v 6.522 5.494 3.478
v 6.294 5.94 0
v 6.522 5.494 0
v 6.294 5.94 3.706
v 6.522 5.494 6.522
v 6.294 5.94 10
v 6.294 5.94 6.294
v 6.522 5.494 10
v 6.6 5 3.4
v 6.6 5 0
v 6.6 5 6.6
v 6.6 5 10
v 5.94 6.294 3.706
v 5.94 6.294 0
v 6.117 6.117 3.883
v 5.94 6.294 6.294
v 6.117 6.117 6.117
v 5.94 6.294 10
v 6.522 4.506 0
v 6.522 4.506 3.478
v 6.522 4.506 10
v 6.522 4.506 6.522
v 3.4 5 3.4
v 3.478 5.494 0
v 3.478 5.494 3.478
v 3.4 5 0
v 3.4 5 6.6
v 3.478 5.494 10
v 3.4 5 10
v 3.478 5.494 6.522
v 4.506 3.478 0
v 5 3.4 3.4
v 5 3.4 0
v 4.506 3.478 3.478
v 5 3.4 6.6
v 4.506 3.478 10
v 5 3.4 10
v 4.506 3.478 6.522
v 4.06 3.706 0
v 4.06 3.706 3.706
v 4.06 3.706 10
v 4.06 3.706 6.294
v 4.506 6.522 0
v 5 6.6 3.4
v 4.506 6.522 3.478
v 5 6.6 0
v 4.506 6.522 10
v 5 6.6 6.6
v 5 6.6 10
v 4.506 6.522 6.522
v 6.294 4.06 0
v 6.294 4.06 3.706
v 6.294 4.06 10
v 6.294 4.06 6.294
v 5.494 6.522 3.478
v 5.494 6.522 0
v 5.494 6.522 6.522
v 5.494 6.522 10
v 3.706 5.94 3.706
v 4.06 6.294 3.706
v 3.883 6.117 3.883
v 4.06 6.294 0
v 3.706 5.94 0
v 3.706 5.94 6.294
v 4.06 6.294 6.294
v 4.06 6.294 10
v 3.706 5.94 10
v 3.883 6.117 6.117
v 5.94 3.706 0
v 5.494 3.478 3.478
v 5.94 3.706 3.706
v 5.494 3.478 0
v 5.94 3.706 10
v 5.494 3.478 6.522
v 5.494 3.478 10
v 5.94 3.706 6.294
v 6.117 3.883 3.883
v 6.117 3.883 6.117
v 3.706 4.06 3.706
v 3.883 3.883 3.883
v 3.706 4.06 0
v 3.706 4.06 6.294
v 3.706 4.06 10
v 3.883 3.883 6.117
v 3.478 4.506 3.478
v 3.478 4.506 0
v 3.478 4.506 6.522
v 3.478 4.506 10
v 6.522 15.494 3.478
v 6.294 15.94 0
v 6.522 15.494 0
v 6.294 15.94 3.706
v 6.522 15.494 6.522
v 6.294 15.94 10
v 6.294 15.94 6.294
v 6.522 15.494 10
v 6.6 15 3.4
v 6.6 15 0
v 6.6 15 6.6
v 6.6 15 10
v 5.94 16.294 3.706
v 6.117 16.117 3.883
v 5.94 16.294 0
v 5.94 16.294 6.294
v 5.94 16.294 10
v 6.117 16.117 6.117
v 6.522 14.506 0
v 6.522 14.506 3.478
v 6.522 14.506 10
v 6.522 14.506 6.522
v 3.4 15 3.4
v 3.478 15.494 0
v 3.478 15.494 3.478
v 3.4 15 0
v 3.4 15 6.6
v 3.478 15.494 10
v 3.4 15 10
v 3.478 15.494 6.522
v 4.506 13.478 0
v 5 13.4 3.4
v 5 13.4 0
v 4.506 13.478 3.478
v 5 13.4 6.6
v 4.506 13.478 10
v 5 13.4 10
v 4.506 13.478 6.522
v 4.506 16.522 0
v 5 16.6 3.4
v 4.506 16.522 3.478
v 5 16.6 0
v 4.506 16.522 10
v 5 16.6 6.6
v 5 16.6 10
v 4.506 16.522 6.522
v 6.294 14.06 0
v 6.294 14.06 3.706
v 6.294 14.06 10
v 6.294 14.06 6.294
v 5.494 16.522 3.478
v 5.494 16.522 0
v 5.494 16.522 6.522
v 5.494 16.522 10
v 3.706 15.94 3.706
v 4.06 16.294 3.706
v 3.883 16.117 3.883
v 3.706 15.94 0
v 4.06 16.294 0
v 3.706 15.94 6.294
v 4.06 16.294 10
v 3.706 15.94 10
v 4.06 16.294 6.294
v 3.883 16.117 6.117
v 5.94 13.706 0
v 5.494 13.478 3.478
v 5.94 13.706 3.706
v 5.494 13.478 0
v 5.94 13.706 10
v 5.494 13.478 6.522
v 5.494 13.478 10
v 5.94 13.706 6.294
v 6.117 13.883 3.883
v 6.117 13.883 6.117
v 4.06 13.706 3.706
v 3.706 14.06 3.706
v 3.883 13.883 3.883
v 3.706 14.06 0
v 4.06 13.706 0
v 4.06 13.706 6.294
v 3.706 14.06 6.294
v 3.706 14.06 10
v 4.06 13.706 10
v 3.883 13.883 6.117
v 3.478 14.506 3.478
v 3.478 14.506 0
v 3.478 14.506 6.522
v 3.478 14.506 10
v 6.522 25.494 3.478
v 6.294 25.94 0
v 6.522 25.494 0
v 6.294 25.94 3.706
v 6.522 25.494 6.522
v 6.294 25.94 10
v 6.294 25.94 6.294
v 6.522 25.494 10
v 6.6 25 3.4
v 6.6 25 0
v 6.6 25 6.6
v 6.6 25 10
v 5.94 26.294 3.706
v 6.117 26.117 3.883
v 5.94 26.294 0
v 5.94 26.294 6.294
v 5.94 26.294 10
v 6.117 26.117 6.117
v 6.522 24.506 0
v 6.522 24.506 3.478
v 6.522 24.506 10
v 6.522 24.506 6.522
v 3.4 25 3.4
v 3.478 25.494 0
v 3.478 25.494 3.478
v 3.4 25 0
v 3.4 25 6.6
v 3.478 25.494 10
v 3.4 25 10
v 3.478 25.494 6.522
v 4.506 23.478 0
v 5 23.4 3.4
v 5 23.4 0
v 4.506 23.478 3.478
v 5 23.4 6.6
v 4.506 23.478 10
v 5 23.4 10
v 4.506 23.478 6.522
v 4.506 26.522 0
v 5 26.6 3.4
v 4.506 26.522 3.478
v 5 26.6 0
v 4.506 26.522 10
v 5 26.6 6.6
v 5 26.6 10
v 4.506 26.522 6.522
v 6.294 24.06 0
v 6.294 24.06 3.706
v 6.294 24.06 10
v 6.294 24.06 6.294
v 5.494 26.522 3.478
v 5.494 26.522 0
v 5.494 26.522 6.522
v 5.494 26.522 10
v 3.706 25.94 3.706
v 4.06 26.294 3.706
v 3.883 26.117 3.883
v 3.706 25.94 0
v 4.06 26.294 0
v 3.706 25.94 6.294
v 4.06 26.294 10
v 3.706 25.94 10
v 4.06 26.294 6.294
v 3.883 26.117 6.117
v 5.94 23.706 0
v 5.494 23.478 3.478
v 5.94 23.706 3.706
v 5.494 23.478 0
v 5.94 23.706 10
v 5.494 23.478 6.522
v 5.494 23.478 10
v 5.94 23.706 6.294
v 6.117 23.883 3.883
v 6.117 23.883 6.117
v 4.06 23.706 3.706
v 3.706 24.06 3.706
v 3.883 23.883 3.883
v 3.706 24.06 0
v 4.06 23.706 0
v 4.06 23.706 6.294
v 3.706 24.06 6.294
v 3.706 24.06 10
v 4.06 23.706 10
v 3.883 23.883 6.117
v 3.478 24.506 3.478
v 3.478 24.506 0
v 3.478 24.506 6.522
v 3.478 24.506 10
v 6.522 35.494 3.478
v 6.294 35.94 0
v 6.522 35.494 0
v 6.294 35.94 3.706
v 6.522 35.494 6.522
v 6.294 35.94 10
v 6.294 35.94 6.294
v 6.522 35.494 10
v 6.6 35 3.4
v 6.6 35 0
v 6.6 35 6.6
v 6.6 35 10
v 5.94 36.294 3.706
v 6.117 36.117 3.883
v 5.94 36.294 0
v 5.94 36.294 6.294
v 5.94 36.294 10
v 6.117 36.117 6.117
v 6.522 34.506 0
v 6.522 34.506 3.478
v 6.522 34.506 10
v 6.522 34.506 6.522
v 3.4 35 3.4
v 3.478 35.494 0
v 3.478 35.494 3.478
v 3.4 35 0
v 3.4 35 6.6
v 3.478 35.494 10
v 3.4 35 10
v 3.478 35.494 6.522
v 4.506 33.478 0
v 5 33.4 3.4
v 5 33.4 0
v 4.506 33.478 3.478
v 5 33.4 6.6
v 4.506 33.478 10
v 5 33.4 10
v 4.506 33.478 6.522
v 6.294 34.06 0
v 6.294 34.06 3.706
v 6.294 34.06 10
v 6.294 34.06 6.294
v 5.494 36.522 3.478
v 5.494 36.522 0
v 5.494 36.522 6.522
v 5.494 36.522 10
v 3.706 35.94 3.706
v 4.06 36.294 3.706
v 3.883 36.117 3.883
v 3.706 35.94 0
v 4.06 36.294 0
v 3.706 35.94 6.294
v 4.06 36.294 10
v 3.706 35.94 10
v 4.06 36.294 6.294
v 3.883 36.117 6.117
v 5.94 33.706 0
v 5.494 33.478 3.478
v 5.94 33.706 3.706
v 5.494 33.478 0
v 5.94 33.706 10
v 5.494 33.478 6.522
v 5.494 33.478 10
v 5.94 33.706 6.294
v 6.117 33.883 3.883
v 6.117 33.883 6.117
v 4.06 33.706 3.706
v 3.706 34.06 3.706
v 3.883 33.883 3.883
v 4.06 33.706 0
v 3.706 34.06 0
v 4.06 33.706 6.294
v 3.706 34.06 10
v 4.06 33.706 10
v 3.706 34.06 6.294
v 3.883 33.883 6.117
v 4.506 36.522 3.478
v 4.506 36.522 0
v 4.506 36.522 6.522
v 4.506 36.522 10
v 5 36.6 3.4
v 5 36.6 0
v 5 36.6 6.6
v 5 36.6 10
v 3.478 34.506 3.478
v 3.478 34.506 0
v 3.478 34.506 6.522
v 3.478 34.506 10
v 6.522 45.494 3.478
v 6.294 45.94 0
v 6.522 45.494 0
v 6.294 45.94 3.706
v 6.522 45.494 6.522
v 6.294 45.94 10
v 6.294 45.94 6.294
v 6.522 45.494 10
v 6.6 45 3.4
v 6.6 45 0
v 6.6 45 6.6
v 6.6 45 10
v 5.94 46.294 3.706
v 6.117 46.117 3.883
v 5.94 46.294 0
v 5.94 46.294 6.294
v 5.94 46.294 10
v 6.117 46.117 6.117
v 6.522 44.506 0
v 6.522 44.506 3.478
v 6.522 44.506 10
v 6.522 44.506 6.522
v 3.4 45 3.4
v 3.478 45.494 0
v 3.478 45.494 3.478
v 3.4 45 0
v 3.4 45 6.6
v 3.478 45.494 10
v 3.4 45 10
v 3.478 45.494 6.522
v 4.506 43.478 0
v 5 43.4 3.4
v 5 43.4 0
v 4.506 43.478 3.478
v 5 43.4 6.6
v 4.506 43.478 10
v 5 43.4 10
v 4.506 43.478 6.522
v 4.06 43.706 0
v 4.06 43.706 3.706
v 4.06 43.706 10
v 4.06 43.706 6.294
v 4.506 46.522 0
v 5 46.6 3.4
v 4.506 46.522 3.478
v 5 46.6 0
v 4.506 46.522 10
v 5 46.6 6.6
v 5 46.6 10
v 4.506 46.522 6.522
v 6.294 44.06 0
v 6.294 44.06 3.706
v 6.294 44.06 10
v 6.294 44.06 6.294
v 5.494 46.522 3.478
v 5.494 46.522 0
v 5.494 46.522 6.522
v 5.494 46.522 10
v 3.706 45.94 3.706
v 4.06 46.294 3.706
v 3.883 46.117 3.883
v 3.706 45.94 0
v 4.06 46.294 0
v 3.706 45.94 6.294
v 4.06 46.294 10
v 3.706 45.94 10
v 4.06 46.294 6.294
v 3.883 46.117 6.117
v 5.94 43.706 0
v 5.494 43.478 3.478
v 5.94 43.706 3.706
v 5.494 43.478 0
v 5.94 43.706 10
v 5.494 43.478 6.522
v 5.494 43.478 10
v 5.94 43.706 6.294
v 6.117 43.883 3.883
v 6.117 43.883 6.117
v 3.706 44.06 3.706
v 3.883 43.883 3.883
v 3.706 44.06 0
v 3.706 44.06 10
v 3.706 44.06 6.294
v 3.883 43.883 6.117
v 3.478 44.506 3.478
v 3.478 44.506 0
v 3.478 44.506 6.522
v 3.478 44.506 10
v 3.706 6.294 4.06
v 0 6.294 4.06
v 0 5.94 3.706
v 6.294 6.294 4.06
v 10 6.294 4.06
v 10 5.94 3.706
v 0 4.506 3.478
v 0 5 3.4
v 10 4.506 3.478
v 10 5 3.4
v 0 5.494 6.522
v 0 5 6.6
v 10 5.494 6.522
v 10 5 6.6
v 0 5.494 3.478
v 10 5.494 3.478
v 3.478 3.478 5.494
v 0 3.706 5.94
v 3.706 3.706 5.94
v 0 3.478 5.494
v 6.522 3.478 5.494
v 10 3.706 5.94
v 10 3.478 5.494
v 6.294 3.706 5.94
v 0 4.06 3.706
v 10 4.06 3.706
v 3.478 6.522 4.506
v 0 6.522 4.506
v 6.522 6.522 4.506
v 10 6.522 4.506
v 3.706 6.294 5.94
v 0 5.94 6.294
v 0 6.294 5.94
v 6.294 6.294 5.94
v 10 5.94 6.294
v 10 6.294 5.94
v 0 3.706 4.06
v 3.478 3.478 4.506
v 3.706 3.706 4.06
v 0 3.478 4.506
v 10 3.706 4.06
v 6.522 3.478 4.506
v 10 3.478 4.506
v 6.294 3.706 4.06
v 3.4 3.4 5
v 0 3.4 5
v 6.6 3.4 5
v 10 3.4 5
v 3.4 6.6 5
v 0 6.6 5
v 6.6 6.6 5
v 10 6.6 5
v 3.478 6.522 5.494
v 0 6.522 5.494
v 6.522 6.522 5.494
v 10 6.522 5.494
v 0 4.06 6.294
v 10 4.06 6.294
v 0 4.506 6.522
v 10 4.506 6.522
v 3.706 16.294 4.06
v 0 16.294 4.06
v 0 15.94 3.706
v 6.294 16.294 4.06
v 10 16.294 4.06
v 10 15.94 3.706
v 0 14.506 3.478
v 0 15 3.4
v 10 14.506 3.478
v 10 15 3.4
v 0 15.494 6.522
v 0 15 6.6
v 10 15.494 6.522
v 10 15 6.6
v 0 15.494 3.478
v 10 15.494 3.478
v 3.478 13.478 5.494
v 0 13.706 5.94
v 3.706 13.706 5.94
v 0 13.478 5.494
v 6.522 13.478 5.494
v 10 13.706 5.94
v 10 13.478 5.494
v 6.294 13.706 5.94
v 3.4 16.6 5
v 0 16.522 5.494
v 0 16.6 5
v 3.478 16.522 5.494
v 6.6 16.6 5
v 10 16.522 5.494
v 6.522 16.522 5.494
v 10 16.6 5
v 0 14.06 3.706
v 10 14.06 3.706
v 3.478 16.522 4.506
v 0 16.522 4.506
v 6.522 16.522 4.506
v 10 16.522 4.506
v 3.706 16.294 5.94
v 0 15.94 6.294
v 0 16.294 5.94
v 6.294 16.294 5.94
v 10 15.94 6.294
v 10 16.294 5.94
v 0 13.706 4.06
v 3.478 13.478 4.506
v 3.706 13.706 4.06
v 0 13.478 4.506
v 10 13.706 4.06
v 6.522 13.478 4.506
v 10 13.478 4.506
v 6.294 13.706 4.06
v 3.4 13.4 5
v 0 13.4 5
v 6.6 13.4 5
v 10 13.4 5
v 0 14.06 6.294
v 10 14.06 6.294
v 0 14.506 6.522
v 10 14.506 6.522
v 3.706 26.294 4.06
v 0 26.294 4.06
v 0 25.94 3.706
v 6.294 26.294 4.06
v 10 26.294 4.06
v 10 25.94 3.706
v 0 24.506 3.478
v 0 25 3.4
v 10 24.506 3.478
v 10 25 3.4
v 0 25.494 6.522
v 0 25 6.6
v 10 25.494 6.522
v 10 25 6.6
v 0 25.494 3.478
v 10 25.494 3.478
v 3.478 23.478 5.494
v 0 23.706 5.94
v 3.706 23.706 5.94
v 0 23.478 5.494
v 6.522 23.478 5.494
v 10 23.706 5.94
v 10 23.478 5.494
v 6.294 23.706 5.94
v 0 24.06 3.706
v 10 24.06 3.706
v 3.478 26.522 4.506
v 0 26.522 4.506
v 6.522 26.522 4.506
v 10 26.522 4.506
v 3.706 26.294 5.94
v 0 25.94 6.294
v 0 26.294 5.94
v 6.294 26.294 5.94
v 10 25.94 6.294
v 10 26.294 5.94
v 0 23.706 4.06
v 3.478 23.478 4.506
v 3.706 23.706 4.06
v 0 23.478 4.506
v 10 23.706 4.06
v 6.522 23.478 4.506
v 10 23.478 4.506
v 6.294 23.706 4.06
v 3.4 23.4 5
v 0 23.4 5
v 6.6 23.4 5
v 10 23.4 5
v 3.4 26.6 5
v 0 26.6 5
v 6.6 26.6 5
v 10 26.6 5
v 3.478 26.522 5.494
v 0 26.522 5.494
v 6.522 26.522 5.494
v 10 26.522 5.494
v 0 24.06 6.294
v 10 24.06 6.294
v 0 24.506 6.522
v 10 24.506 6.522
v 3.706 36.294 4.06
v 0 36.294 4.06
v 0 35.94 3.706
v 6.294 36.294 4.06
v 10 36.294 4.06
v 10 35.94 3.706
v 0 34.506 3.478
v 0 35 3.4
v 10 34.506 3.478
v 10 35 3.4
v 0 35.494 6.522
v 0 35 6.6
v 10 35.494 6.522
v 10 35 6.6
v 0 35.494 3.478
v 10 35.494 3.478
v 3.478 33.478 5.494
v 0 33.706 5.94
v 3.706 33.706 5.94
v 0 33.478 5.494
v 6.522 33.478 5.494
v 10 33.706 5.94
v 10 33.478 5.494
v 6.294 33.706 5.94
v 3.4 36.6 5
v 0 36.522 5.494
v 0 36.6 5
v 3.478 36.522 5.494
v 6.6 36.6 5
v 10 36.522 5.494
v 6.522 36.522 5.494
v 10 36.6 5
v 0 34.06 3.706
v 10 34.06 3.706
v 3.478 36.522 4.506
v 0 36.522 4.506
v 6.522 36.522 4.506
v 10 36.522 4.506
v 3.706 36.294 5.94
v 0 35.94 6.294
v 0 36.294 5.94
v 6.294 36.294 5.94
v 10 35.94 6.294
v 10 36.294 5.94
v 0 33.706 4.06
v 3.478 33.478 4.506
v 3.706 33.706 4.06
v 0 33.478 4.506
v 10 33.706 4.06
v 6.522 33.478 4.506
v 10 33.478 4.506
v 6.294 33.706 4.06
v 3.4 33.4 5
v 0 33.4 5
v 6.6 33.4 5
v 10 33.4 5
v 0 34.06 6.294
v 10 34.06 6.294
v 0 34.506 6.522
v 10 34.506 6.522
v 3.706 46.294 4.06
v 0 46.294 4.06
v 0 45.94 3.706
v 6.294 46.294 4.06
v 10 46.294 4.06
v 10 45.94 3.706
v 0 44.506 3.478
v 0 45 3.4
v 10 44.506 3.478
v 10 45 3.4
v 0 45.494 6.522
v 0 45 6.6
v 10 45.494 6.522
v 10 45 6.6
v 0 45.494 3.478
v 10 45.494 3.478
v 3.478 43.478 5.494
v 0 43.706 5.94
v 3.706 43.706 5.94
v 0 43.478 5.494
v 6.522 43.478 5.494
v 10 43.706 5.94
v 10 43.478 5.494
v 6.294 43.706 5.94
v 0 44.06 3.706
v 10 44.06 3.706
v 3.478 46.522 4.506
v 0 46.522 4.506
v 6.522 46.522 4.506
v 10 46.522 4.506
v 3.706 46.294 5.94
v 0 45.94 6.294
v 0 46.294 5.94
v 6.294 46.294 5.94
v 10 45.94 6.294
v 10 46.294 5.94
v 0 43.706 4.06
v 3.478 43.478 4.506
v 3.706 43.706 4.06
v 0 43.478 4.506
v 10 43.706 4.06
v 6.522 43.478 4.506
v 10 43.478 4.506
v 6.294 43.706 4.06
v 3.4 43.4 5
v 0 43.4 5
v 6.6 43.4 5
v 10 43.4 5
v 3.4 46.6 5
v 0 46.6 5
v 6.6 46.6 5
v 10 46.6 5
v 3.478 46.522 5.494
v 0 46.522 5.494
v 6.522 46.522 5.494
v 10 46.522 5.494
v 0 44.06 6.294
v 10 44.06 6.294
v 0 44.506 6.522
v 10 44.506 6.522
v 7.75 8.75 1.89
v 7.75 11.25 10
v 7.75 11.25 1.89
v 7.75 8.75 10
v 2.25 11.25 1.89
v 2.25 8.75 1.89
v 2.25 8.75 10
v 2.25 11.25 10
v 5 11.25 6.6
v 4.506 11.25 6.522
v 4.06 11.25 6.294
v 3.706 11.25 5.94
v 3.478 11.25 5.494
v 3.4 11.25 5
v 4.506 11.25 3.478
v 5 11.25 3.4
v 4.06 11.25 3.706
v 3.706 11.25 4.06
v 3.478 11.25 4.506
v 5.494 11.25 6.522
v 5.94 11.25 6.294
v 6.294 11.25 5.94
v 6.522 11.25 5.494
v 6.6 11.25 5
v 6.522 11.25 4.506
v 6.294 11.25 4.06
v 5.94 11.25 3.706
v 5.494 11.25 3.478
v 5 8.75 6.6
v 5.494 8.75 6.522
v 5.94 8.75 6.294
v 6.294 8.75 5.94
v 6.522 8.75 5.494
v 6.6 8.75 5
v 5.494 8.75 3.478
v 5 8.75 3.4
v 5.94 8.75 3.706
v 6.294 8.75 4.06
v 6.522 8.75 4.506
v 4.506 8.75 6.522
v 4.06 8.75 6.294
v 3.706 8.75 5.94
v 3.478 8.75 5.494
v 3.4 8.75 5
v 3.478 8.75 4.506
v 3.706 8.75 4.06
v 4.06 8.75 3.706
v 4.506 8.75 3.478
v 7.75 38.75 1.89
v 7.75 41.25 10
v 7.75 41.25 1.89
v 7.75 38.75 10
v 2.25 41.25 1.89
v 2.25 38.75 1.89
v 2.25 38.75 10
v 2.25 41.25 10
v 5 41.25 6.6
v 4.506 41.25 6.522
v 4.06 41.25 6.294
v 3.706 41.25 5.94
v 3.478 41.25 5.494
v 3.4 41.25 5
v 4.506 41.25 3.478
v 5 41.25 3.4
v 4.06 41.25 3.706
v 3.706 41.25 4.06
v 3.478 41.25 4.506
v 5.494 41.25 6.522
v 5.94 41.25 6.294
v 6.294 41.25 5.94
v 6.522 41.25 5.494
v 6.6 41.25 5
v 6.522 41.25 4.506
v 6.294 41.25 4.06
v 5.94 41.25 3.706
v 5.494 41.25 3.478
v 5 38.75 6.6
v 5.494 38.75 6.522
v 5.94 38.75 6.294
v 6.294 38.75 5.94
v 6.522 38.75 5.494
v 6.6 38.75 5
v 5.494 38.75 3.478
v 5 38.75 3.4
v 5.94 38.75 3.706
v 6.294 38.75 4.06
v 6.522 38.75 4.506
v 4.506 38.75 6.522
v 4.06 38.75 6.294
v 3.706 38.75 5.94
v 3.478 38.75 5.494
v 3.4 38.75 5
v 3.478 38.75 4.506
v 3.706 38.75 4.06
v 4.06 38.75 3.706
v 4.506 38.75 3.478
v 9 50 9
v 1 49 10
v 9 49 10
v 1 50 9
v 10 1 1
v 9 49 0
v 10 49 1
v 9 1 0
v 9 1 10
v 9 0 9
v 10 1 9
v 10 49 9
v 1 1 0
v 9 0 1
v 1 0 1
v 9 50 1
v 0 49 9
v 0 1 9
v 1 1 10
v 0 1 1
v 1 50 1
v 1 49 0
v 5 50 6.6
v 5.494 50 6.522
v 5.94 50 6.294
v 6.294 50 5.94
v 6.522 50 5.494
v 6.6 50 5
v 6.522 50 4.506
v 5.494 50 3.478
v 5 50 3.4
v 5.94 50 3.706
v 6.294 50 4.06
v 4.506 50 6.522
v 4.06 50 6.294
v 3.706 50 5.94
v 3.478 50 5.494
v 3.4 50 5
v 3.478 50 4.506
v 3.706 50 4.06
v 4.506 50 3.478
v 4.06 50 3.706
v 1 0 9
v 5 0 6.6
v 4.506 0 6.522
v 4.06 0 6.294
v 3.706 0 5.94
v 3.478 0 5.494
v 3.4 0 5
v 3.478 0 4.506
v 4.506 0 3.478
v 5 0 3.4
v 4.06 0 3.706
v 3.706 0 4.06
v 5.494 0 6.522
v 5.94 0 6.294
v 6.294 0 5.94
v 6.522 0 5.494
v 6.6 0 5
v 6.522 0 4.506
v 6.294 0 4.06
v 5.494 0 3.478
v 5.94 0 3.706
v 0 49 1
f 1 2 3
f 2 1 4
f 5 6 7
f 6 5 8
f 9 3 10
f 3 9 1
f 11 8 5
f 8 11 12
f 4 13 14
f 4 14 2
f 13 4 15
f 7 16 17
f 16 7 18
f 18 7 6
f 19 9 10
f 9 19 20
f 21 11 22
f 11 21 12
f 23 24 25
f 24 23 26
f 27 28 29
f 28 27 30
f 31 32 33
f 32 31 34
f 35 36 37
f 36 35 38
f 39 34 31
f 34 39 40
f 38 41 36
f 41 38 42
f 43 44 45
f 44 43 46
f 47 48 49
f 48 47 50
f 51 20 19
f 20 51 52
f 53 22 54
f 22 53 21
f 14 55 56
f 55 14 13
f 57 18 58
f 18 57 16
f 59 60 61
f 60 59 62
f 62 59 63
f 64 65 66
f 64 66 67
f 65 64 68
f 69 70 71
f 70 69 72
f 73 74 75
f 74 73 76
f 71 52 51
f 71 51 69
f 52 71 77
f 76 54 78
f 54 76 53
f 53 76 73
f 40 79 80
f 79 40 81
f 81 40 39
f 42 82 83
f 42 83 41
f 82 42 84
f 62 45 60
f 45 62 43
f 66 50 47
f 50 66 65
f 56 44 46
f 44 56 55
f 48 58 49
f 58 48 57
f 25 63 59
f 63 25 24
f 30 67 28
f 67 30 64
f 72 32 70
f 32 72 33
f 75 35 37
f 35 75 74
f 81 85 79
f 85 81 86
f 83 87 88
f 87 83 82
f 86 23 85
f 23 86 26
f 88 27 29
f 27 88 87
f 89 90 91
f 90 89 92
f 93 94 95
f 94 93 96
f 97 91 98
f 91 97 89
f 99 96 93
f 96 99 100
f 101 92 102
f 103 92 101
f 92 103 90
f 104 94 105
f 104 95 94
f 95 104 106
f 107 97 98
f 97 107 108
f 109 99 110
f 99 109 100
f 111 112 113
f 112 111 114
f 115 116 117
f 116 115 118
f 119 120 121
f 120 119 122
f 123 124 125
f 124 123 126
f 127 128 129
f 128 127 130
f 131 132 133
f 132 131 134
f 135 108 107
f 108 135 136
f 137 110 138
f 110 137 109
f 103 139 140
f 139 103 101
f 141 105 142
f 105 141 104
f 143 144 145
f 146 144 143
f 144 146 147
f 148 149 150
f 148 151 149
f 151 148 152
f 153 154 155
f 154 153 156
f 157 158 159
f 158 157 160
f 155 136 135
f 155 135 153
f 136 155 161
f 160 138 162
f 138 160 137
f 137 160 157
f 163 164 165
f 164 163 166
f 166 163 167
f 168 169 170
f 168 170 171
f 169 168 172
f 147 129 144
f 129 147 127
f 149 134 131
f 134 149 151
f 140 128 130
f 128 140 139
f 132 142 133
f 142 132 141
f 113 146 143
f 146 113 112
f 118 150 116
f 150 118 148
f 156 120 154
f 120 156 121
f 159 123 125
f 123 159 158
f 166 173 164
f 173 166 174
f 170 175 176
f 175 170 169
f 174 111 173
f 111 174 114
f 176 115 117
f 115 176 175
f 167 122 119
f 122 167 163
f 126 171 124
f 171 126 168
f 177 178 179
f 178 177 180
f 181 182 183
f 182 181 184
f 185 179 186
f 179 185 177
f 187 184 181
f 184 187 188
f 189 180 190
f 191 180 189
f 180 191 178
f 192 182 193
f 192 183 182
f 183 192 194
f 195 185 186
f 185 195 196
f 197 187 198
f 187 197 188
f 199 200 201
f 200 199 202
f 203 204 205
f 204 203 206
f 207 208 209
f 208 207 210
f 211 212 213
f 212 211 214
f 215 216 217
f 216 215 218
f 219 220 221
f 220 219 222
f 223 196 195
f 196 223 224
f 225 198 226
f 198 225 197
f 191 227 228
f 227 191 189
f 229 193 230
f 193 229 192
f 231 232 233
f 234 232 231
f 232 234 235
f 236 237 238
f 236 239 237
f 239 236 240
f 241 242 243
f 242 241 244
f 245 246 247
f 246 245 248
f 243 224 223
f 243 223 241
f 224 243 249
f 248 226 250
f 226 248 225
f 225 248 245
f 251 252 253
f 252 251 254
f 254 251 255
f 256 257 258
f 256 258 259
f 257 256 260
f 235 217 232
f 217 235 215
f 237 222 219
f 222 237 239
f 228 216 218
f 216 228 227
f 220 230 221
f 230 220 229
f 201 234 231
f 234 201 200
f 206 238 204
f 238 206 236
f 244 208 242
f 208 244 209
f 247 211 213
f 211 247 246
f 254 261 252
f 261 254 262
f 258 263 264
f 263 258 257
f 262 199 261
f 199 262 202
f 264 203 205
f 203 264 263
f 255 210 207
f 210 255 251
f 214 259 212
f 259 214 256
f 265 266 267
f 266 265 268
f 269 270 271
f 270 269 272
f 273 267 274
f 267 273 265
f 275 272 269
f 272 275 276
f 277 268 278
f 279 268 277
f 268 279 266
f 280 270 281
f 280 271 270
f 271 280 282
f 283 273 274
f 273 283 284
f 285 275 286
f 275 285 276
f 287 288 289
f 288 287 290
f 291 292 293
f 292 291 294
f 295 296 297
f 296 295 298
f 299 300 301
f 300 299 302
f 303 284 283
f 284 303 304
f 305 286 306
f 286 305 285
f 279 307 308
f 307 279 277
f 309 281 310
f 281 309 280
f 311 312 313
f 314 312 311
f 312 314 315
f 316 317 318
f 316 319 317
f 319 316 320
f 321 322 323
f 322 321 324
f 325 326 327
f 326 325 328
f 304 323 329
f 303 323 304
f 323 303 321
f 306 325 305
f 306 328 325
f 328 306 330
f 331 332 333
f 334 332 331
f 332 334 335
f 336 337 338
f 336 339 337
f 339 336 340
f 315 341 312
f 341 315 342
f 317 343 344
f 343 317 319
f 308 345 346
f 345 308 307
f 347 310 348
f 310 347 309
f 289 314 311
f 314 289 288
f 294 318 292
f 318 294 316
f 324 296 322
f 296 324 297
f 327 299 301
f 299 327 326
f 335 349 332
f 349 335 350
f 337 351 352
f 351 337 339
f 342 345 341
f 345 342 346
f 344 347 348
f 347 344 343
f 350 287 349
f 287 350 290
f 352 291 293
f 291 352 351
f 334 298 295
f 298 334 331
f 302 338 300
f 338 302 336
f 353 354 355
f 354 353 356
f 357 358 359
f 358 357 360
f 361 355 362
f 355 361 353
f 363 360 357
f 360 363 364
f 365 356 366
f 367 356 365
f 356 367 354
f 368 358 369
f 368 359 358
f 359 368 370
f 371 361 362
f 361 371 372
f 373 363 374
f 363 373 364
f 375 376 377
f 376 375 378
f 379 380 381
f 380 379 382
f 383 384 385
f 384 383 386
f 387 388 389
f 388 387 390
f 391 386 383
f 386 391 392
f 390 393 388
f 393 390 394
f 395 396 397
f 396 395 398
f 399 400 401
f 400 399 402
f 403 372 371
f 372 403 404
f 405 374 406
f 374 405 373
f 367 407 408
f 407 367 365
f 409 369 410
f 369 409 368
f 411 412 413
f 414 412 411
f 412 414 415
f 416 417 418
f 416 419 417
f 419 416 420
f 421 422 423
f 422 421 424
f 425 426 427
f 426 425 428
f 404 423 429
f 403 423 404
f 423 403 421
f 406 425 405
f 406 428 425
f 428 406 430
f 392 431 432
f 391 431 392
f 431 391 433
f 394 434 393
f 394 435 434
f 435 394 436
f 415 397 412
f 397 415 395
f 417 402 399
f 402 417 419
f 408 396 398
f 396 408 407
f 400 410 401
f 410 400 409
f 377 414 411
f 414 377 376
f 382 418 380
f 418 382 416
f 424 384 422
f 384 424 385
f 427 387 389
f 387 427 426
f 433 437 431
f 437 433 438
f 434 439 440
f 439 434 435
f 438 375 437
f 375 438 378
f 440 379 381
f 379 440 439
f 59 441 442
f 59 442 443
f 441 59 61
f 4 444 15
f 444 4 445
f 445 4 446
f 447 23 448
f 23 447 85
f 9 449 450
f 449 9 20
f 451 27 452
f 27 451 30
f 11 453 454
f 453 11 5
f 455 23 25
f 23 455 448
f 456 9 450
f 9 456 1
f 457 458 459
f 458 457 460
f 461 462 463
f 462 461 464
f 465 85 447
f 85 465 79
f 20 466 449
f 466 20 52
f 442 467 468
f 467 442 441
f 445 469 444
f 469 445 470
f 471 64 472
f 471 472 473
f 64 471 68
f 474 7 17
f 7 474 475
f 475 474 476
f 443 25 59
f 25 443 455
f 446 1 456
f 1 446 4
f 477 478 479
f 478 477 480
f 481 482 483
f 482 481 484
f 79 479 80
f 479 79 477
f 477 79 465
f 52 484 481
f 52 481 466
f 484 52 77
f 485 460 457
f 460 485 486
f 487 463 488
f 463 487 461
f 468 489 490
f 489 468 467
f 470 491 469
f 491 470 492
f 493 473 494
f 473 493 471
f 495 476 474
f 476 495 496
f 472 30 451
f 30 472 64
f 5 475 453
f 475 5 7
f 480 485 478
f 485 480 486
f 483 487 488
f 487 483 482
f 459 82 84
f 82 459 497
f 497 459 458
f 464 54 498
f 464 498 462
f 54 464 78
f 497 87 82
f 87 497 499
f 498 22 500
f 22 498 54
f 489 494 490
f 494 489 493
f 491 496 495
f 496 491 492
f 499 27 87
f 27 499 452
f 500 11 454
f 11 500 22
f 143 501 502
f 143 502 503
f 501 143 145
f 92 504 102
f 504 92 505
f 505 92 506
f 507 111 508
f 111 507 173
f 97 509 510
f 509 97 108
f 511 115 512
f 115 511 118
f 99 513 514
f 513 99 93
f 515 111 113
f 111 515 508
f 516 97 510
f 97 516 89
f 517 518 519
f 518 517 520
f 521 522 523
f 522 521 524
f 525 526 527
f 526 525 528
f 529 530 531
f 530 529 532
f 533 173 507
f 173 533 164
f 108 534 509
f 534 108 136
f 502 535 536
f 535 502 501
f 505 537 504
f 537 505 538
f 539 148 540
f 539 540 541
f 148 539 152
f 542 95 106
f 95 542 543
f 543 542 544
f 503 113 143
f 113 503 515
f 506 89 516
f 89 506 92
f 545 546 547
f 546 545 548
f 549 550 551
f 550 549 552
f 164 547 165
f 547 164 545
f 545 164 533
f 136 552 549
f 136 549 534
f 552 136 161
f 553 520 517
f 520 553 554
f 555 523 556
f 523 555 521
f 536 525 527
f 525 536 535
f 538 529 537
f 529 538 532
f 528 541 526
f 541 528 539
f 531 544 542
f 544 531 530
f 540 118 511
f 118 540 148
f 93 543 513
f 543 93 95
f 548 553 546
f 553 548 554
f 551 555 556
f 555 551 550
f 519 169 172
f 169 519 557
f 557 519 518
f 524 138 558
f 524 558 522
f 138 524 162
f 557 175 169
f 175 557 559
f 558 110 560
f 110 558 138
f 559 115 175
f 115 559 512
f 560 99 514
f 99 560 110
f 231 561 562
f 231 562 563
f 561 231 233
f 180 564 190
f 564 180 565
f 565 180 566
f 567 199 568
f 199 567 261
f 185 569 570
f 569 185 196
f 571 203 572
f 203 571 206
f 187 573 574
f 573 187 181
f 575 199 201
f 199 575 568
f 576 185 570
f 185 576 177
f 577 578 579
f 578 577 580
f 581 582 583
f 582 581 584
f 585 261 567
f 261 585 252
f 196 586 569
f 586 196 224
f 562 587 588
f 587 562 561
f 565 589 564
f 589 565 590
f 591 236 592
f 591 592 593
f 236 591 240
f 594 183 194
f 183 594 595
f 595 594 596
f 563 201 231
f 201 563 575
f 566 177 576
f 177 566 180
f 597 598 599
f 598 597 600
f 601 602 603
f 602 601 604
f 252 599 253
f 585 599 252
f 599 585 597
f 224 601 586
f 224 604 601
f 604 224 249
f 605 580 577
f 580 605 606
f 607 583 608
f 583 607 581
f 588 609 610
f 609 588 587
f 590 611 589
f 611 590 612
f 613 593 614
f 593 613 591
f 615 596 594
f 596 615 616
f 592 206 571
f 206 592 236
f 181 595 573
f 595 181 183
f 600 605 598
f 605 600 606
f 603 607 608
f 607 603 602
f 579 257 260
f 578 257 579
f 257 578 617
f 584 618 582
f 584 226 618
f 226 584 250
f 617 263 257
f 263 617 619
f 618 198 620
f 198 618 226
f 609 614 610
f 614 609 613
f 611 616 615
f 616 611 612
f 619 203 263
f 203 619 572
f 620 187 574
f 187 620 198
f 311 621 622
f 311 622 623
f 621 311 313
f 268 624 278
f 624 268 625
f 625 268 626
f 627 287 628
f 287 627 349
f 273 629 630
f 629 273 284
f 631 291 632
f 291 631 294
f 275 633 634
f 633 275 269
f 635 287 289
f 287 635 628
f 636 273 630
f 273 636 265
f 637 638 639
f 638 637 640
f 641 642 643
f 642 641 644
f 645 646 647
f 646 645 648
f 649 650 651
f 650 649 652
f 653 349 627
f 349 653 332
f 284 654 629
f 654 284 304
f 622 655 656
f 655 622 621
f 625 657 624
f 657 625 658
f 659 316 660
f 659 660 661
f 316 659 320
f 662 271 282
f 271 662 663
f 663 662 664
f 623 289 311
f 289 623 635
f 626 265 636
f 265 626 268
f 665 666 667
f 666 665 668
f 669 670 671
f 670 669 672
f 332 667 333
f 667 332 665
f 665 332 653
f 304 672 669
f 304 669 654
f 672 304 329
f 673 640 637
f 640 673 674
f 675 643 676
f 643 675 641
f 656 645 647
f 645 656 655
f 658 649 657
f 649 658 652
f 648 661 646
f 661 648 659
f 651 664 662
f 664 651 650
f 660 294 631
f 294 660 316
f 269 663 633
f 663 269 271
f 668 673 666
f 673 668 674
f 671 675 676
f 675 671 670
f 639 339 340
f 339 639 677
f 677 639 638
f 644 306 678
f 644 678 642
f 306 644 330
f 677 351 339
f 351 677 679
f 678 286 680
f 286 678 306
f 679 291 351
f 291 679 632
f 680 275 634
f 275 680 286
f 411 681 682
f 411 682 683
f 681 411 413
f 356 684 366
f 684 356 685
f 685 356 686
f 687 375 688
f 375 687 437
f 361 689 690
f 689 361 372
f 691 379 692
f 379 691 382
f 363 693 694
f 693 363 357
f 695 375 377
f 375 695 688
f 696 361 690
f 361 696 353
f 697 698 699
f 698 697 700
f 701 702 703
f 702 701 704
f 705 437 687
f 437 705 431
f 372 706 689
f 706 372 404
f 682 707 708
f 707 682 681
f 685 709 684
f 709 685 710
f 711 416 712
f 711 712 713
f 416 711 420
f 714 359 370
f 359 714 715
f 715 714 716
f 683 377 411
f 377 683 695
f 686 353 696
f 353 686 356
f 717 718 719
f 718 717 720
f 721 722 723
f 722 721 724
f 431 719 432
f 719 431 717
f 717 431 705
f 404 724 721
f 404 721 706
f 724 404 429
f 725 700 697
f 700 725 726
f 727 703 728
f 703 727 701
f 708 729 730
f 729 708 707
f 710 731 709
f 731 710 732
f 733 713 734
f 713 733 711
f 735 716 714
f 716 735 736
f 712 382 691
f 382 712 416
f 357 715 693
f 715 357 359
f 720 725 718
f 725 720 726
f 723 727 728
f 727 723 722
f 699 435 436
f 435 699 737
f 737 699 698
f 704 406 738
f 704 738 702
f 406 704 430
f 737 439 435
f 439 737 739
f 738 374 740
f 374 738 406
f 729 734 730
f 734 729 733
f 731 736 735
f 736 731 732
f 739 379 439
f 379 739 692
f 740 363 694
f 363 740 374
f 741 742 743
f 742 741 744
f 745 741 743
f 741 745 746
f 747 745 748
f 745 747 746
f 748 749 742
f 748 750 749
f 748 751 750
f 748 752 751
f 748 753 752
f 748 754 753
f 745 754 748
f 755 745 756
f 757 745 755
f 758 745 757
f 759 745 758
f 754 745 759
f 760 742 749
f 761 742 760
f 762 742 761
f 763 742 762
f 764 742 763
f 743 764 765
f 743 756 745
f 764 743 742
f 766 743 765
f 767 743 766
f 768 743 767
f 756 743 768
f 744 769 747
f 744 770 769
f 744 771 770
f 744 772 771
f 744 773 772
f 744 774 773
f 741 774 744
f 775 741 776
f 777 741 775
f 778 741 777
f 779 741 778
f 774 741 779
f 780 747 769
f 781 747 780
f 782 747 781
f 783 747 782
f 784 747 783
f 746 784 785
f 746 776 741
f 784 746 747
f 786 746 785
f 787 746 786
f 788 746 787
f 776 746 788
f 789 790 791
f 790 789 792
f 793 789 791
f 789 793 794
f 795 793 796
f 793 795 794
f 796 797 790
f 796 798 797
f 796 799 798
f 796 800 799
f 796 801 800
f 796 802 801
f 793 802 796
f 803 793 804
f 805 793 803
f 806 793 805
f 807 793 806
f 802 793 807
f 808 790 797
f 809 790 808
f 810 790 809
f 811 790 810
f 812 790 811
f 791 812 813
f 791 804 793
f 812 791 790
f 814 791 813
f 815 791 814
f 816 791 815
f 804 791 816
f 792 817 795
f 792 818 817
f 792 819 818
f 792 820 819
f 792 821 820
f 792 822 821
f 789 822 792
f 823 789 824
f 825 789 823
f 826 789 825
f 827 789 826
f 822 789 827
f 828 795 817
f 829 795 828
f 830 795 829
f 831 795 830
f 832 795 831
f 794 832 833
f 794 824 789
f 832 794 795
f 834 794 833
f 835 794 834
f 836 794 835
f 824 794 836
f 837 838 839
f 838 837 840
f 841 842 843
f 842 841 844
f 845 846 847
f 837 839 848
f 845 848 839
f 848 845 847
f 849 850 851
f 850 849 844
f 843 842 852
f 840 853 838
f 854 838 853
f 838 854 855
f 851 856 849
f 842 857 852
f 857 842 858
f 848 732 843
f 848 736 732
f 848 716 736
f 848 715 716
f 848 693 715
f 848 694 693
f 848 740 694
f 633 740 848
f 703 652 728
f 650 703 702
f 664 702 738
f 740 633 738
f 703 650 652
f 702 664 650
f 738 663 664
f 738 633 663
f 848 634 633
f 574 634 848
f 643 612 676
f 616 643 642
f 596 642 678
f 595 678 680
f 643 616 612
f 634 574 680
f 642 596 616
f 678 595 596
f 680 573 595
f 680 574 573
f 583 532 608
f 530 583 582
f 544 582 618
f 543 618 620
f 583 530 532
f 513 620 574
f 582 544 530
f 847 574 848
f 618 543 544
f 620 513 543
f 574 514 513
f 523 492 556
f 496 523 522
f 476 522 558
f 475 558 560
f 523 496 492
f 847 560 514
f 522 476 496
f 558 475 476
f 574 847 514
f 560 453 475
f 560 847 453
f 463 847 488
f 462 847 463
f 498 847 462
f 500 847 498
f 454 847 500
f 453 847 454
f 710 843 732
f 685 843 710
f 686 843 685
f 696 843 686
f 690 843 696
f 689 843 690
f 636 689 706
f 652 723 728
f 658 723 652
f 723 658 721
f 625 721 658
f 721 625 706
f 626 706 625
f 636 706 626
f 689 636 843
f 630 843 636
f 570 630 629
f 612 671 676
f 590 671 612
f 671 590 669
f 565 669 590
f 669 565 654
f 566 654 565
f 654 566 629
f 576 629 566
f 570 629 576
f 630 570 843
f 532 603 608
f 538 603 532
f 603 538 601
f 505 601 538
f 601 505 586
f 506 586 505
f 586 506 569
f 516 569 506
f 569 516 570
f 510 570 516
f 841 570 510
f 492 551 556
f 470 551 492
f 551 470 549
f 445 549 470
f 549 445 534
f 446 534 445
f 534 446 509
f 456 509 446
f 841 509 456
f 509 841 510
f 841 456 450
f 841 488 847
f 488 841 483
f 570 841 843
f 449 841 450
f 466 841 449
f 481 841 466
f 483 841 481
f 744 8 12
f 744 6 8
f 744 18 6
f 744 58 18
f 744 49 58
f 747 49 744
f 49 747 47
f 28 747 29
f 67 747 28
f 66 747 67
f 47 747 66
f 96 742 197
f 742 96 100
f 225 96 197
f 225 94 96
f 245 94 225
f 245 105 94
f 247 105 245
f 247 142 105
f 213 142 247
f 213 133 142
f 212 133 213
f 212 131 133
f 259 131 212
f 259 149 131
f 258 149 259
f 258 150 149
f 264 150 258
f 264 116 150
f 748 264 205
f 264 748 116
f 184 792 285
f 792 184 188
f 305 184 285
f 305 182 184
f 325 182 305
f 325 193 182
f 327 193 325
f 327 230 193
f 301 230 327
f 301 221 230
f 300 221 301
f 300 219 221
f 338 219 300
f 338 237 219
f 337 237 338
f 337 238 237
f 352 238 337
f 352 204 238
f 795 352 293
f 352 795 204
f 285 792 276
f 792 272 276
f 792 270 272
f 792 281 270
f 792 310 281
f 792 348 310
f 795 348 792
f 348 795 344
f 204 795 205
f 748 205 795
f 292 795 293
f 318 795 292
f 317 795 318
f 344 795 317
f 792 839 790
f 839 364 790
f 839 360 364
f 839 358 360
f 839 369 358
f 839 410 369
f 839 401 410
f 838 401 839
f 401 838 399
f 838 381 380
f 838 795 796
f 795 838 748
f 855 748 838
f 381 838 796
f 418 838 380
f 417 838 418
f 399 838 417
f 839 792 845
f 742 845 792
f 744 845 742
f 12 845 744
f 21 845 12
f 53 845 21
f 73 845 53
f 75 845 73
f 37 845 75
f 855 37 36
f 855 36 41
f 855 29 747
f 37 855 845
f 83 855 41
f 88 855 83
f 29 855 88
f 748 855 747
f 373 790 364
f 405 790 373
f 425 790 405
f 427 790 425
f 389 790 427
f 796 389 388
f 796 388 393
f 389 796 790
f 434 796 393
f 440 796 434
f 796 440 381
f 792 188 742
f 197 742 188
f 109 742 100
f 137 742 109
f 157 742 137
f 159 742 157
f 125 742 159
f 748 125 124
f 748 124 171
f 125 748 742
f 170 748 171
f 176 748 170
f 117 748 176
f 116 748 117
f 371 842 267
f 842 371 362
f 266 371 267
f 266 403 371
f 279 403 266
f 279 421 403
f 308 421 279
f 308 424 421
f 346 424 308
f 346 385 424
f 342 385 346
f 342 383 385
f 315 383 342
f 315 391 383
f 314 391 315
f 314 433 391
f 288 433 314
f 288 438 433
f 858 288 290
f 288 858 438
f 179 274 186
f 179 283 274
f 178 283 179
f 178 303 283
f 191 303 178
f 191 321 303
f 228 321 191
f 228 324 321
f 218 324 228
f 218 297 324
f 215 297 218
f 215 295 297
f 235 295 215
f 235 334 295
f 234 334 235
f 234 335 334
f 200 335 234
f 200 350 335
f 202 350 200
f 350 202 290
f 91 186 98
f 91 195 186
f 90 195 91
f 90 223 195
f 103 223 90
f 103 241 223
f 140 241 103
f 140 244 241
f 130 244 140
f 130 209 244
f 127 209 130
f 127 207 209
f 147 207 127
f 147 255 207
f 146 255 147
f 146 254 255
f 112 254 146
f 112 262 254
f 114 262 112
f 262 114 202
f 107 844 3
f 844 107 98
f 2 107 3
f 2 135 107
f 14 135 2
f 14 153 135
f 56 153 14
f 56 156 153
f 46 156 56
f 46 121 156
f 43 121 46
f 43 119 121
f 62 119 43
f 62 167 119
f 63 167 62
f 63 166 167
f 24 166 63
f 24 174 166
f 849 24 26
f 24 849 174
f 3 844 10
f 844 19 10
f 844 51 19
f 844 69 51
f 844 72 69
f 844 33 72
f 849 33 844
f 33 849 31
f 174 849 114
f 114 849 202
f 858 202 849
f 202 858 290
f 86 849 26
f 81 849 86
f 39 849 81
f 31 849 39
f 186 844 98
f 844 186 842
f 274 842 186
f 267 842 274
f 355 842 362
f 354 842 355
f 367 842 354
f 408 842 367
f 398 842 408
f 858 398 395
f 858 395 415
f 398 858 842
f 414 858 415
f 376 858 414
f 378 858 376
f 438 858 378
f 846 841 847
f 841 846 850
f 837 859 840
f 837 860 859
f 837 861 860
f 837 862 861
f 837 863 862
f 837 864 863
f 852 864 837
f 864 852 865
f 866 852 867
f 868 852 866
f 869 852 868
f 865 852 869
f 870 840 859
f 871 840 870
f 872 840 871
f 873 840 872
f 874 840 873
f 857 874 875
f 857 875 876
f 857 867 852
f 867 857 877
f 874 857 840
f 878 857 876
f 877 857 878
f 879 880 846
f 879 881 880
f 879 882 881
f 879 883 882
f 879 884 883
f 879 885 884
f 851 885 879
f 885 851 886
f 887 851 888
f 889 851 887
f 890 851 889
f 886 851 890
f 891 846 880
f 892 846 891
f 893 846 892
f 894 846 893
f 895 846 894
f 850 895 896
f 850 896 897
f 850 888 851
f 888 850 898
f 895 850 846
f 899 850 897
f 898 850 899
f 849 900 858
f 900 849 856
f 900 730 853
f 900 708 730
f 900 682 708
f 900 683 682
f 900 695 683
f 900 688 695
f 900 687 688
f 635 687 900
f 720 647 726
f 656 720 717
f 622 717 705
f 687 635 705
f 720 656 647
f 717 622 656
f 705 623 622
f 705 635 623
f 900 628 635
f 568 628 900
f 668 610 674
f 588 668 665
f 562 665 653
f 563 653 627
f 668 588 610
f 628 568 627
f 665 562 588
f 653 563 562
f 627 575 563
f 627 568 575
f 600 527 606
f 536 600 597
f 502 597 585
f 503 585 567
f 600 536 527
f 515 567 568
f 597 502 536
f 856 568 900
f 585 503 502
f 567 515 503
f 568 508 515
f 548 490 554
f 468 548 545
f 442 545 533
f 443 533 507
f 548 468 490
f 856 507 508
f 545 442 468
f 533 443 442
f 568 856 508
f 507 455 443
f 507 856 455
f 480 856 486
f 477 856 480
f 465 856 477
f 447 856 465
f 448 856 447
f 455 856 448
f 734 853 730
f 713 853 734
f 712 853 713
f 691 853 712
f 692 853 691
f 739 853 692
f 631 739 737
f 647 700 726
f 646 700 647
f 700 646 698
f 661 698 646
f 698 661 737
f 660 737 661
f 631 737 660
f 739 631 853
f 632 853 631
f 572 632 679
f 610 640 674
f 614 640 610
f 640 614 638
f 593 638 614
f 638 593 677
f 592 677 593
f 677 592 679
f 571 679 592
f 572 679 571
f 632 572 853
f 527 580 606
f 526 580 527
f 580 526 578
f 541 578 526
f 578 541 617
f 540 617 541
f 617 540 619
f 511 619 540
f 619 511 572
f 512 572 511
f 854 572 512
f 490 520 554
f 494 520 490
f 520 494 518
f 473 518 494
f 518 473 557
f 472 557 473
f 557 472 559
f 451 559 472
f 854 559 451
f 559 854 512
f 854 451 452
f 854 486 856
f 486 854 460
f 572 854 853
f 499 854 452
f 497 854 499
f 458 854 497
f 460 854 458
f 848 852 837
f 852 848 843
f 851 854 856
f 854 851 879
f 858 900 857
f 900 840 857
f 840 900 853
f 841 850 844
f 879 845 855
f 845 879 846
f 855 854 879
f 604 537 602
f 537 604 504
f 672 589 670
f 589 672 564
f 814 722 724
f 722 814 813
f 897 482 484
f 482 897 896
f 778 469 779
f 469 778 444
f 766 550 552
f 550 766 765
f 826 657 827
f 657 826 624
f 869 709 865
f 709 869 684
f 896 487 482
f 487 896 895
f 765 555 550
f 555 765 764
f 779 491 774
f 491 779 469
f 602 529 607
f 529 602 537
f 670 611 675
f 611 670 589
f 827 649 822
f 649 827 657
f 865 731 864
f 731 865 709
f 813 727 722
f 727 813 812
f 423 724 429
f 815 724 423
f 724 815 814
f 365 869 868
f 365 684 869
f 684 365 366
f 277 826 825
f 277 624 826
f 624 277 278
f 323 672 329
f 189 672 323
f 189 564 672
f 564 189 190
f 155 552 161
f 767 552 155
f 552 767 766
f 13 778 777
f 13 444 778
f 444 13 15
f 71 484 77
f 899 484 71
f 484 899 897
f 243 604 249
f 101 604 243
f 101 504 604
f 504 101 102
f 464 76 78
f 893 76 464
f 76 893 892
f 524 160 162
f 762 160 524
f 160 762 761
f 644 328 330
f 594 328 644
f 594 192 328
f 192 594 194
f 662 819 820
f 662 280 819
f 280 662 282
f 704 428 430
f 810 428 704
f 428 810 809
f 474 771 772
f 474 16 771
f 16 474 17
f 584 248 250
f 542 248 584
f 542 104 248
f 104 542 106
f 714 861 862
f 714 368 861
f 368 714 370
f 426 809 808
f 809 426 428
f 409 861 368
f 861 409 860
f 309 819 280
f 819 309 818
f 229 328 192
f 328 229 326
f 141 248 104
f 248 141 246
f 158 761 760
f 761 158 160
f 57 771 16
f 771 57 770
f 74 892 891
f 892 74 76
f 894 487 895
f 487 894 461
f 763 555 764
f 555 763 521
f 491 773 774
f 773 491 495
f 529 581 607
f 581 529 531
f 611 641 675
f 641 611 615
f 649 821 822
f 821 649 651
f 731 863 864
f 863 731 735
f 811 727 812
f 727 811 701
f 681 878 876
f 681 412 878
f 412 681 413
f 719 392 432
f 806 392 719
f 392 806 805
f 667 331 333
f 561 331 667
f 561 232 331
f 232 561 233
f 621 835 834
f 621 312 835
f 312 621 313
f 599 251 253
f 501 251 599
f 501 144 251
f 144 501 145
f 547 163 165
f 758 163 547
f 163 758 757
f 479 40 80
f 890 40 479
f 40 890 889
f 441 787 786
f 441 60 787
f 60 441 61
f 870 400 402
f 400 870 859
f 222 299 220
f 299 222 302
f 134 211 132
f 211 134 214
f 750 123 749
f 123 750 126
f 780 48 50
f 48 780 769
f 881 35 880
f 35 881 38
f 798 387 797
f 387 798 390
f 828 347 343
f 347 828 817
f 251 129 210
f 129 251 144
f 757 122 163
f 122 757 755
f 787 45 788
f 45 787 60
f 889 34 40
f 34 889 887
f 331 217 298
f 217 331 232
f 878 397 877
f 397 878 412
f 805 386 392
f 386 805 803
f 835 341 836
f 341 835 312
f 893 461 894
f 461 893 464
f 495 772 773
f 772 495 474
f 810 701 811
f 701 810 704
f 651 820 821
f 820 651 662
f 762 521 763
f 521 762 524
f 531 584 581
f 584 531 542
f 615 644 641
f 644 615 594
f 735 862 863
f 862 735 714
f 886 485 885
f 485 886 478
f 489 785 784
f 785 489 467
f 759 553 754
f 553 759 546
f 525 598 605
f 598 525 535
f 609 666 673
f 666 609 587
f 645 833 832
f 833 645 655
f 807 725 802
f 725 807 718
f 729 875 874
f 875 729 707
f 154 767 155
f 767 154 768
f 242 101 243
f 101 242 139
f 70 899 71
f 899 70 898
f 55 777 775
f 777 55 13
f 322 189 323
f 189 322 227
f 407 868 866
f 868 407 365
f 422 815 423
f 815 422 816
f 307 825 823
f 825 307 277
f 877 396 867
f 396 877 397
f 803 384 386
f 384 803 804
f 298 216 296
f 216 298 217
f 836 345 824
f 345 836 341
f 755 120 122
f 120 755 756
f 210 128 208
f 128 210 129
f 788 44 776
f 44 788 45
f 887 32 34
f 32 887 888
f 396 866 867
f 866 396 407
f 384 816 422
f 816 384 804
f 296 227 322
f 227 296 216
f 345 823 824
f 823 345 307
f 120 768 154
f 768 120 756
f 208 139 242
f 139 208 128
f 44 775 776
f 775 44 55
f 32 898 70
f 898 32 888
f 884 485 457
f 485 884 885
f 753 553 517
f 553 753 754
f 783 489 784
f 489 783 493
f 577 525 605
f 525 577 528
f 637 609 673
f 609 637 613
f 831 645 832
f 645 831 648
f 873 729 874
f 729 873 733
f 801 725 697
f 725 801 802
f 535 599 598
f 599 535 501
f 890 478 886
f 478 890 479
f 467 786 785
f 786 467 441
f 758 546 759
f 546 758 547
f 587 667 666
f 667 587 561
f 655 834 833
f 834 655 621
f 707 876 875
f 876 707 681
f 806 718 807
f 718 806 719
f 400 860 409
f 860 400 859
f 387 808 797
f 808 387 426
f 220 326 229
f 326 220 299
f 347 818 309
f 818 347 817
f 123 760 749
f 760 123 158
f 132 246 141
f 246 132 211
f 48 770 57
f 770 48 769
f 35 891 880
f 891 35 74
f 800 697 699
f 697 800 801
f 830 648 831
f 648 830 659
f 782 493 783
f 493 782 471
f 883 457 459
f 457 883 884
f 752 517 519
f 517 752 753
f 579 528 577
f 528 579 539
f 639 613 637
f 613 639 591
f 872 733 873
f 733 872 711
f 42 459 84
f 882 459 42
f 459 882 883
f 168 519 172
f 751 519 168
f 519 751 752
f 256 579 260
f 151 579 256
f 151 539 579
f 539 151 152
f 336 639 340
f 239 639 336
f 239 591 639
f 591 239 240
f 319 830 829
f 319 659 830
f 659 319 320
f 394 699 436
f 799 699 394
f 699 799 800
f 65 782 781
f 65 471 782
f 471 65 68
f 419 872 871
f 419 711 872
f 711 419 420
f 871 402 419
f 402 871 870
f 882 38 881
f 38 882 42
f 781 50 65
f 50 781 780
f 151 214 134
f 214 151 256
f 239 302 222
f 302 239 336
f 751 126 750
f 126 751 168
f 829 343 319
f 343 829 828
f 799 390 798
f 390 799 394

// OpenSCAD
//The following variables are adjustable:
N = 5; // The number of 10mm length segments, or the number of holes along one edge. N does not strictly need to be a whole number, e.g. if N is 3.4 the resulting part will be 34 mm long. N can be 1 if a 1x1x1 cube with no nut pockets is desired.
HOLE_DIAMETER = 3.2; //Default 3.0 Nominal diameter of all through-holes. Adjustable to suit different printers, print settings, fasteners. 
NUT_THICKNESS = 2.5; // The nominal thickness of the nuts used in the rectangular nut pockets at the ends. Determines the shorter dimension of the rectangle that defines the pocket shape.
NUT_MIN_WIDTH = 5.5; // The inscribed diameter of the nuts used, or in other words the perpendicular distance between two opposite sides of the hexagon. Determines the longer dimension of the rectangle that defines the pocket shape.
NUT_MAX_WIDTH = 6.22; // The circumscribed diameter of the nuts used, or in other words the distance between two opposite corners of the hexagon. Determines the depth of the nut pocket, and therefore the alignment of the nut in line with the end holes.
CHAMFER = 1.0; // The length of the legs of the triangle that defines the edge chamfer profile.

//modules

module chamferCube(dimensions,depth){
    //where dimensions is a vector e.g. [10,20,30] and depth is the depth of the chamfer.
    
    f=2*depth;
    
    octaPoints = [ 
                    [1,0,0],
                    [0,1,0],
                    [-1,0,0],
                    [0,-1,0],
                    [0,0,1],
                    [0,0,-1]
                ];

    octaFaces = [   
                    [0,4,1],
                    [1,4,2],
                    [2,4,3],
                    [3,4,0],
                    [0,1,5],
                    [1,2,5],
                    [2,3,5],
                    [3,0,5] 
                ];
    translate([depth,depth,depth])
    minkowski(){
        cube([dimensions[0]-f,dimensions[1]-f,dimensions[2]-f]);
        polyhedron(octaPoints*depth, octaFaces);
    }
}

//variables (derived and not to be edited)
bodyLength = N*10;


difference(){
    chamferCube([10,bodyLength,10],CHAMFER);
    for (i = [0:N-1]){
        translate([5,5+(i*10),-1]){
            cylinder(h=15, d=HOLE_DIAMETER,center = false,$fn=20);
        }
    }
    for (i = [0:N-1]){
        translate([5,5+(i*10),5]){
             rotate(90,[0,1,0]){
                 cylinder(h=30, d=HOLE_DIAMETER,center = true,$fn=20);
                }
        }
    }
    if(N>=1.5){
    translate([5-(NUT_MIN_WIDTH / 2),10-(NUT_THICKNESS / 2),5-(NUT_MAX_WIDTH / 2)]){
        cube([NUT_MIN_WIDTH,NUT_THICKNESS,9],center = false);
    }
    translate([5-(NUT_MIN_WIDTH / 2),10-(NUT_THICKNESS / 2)+bodyLength - 20,5-(NUT_MAX_WIDTH / 2)]){
        cube([NUT_MIN_WIDTH,NUT_THICKNESS,9],center = false);
    }
    }
    translate([5,-1,5]){
        rotate(90,[-1,0,0]){
            cylinder(h=bodyLength+2,d=HOLE_DIAMETER,center = false,$fn=20);
        }
    }
    
    
}
